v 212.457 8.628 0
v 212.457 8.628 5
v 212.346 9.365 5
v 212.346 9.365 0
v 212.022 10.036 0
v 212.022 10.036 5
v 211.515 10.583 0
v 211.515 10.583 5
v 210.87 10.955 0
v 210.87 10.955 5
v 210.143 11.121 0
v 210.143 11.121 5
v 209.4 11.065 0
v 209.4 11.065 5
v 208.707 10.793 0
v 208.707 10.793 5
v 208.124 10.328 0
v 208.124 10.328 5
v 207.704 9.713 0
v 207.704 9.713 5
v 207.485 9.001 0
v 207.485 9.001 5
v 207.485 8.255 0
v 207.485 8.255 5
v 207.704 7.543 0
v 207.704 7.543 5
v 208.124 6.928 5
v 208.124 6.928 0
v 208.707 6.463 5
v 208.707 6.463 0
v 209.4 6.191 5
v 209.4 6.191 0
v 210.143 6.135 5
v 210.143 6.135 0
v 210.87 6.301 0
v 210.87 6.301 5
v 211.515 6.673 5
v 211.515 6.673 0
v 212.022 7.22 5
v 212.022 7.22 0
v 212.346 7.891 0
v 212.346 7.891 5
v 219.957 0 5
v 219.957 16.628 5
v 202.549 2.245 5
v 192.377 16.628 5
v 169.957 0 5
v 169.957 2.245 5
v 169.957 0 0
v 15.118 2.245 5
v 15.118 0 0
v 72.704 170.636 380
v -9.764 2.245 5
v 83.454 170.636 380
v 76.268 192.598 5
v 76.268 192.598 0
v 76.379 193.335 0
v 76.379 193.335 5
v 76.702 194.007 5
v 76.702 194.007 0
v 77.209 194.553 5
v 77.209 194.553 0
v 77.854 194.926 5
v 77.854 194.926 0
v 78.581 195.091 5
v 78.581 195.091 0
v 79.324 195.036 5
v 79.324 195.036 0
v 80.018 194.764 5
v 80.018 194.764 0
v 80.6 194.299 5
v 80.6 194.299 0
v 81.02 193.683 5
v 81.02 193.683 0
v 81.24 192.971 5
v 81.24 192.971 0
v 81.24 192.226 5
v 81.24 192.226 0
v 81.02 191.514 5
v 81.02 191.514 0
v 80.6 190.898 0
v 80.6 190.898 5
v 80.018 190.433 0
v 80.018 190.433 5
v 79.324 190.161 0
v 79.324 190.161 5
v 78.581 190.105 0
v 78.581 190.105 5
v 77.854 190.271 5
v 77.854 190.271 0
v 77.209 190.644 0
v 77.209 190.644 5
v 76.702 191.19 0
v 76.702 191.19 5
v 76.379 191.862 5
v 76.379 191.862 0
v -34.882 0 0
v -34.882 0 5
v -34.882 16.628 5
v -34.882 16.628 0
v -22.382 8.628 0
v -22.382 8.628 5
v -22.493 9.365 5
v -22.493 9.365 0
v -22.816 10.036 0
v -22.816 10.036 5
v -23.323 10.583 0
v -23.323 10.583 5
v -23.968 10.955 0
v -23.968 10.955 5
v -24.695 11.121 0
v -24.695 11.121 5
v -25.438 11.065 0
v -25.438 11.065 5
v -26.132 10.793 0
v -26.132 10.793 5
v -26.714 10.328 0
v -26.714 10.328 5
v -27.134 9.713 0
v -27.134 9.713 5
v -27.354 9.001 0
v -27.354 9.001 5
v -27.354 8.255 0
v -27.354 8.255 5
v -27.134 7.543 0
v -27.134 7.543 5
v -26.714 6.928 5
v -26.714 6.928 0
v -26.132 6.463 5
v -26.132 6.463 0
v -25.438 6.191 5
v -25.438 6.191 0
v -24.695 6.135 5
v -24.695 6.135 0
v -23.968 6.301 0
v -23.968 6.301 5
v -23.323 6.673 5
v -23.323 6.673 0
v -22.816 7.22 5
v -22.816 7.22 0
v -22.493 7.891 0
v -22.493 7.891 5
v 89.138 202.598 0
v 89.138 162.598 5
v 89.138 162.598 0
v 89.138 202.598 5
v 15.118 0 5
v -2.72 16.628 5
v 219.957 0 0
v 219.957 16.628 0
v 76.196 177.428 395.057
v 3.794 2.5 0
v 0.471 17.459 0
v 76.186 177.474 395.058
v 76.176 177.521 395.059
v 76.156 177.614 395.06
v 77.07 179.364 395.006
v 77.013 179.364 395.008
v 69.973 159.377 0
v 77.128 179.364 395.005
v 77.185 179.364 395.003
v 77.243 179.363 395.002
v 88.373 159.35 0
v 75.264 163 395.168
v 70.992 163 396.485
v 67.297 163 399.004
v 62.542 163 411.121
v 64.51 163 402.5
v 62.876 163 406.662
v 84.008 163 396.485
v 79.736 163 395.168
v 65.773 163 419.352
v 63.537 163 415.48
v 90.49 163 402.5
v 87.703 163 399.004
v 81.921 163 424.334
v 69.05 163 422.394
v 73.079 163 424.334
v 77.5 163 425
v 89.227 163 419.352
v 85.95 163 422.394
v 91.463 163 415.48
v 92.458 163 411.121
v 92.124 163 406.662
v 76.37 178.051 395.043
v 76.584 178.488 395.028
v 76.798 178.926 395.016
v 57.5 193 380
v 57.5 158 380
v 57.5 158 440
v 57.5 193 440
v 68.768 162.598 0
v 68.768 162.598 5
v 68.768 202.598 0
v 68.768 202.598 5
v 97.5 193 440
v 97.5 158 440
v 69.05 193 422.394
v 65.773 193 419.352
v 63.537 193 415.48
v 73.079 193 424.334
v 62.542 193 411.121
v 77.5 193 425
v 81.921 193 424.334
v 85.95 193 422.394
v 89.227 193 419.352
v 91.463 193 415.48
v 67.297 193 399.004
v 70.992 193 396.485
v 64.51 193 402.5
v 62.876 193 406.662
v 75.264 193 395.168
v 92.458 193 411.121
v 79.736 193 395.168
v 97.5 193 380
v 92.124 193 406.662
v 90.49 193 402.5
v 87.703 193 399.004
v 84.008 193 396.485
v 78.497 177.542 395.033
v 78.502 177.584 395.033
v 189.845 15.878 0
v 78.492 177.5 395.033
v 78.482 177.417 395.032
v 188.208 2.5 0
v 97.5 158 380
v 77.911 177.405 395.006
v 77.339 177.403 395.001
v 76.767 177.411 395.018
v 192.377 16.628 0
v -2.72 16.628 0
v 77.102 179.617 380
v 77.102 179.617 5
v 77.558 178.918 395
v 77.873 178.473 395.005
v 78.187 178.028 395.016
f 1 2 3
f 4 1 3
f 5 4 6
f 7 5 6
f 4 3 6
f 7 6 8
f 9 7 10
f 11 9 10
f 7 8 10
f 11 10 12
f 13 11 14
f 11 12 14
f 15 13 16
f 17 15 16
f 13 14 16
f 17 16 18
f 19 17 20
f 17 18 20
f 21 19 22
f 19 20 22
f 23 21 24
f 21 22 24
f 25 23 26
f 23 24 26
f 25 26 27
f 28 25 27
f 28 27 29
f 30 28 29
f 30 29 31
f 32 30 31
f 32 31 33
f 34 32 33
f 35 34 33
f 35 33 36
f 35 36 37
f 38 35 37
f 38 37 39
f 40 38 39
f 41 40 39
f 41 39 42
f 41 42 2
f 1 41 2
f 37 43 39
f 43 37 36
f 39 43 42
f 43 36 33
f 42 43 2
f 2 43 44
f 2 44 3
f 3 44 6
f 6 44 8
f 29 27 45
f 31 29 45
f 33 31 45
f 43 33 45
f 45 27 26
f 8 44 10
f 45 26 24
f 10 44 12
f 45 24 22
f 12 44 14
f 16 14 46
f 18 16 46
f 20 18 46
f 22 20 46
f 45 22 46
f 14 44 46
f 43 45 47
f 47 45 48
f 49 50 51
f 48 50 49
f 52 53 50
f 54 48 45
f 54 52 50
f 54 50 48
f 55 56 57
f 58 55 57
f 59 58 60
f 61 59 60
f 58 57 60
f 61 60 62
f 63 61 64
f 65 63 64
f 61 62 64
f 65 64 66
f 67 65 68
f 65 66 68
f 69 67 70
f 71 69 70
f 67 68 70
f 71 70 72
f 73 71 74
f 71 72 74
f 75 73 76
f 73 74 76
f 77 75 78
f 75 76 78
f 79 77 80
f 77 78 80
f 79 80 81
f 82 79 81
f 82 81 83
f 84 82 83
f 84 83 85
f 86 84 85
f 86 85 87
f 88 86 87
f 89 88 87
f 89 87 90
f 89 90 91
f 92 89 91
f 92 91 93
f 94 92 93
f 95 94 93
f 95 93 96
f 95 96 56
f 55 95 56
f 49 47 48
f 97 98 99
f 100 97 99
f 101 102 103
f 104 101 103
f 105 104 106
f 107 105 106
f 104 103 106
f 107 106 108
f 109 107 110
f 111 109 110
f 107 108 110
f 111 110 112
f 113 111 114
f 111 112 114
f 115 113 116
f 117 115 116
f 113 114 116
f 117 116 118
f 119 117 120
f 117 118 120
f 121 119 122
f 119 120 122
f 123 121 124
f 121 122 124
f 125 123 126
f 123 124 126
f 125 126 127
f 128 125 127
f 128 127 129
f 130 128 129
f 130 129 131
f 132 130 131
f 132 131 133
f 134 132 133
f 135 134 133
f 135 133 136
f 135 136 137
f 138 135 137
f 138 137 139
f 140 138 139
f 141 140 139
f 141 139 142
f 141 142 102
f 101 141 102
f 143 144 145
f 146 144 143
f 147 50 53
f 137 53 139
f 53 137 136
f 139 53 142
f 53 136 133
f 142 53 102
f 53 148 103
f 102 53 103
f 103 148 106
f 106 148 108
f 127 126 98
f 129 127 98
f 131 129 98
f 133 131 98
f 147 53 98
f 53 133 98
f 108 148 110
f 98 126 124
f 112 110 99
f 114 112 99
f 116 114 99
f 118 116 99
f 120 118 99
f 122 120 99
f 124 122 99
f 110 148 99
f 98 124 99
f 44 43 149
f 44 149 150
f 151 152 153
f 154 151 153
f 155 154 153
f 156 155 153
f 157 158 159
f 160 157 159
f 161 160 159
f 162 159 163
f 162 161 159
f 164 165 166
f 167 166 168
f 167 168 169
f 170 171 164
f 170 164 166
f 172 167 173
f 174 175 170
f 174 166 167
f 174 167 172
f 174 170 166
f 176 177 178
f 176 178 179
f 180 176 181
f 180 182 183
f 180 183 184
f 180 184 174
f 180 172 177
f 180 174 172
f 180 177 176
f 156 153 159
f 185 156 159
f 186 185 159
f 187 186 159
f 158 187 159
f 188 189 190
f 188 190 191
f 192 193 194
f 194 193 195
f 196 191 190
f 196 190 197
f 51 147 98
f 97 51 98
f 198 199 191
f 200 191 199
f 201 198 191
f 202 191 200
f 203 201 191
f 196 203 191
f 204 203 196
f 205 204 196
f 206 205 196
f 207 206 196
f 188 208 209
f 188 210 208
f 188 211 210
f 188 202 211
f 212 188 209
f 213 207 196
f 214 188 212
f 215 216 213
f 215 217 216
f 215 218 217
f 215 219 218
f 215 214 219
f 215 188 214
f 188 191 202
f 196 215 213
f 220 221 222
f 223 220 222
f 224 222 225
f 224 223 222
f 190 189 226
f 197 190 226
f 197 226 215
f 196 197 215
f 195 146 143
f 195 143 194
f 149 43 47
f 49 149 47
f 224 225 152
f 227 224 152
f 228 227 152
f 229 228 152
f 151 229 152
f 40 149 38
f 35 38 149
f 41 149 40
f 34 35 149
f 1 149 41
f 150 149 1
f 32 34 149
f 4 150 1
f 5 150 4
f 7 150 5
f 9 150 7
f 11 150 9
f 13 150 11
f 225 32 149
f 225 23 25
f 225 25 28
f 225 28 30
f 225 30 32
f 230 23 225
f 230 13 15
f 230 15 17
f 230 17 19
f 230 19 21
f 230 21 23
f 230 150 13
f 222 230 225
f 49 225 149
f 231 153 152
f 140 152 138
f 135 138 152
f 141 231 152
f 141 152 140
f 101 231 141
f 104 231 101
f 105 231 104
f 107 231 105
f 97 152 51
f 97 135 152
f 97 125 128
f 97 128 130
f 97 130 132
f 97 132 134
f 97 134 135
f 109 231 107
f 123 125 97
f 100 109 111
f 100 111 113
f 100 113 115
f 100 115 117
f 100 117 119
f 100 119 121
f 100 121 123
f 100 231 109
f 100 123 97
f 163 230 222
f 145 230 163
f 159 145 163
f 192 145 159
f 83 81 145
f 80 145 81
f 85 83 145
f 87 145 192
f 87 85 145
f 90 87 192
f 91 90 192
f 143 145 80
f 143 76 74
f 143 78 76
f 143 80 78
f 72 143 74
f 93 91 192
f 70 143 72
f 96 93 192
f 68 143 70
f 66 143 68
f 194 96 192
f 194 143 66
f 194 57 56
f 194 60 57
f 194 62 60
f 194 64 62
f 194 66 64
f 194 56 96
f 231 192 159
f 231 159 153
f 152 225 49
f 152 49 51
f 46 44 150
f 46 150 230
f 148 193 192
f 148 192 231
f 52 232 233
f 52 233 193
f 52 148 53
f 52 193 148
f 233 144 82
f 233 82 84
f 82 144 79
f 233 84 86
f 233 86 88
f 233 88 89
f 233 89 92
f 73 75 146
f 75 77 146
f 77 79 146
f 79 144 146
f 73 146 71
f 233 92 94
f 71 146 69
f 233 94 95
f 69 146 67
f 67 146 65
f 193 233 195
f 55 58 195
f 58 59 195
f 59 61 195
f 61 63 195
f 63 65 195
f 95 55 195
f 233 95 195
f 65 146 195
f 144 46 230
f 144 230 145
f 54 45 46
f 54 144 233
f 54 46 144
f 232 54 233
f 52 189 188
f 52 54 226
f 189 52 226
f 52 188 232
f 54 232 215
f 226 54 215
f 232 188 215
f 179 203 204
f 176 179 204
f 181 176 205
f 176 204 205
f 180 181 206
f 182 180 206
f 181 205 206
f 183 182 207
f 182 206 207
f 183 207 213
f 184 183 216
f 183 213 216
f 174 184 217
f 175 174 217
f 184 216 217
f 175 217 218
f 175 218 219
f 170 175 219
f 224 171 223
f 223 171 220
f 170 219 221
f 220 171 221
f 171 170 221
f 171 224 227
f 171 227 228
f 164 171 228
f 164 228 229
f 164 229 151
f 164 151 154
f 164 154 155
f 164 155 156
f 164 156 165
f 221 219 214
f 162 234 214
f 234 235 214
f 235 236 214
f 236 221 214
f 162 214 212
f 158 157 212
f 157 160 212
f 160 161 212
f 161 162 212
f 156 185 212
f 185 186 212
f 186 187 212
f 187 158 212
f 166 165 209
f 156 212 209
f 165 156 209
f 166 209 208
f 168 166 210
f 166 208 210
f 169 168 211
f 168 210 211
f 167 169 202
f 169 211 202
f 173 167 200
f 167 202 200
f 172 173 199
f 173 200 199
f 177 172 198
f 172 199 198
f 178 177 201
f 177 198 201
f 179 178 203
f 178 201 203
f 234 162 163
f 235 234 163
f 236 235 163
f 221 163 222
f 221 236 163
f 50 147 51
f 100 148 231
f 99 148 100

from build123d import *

# Parameters (mm, degrees)
ESBO_O11_W               = 40
ESBO_O11_H               = 35
CORTE_EXTRUS_O2_DEPTH    = 20
ESBO_O12_W               = 40
ESBO_O12_H               = 35
RESSALTO_EXTRUS_O2_DEPTH = 60
ESBO_O14_R               = 15
CORTE_EXTRUS_O3_DEPTH    = 30
ESBO_O16_W               = 51.962510692
ESBO_O16_H               = 33.256097344
CORTE_EXTRUS_O5_DEPTH    = 5
ESBO_O17_W               = 50
ESBO_O17_H               = 16.628048672
RESSALTO_EXTRUS_O3_DEPTH = 5
ESBO_O18_W               = 68.360533092
ESBO_O18_H               = 33.256097344
CORTE_EXTRUS_O7_DEPTH    = 5
ESBO_O19_W               = 50
ESBO_O19_H               = 16.628048672
RESSALTO_EXTRUS_O4_DEPTH = 5
ESBO_O20_W               = 24.072418746
ESBO_O20_H               = 34.036375749
CORTE_EXTRUS_O8_DEPTH    = 5
ESBO_O21_W               = 20.37066465
ESBO_O21_H               = 40
RESSALTO_EXTRUS_O5_DEPTH = 5
ESBO_O22_R               = 2.5
CORTE_EXTRUS_O9_DEPTH    = 10
ESBO_O23_R               = 2.5
CORTE_EXTRUS_O10_DEPTH   = 10


with BuildPart() as part:
    # Esboço2 → Loft1 section 0
    with BuildSketch(Plane.XY, mode=Mode.PRIVATE) as loft1_s0:
        with BuildLine():
            Line((-10.863095238, 0), (204.136904762, 0))
            Line((204.136904762, 0), (77.102021041, 179.616642653))
            Line((77.102021041, 179.616642653), (-10.863095238, 0))
        make_face()
    loft([loft1_s0.sketch, Vertex(77.102021041, 179.616642653, 400)])

    # Esboço11 → Corte-extrusão2 (cut)
    with BuildSketch(Plane(origin=(77.102021041, 179.616642653, 400), x_dir=(1, 0, 0), z_dir=(0, 0, 1))):
        Rectangle(ESBO_O11_W, ESBO_O11_H)
    extrude(amount=-CORTE_EXTRUS_O2_DEPTH, mode=Mode.SUBTRACT)

    # Esboço12 → Ressalto-extrusão2 (add)
    with BuildSketch(Plane.XY.offset(380)):
        with Locations((77.5, 175.5)):
            Rectangle(ESBO_O12_W, ESBO_O12_H)
    extrude(amount=RESSALTO_EXTRUS_O2_DEPTH)

    # Esboço14 → Corte-extrusão3 (cut)
    with BuildSketch(Plane(origin=(0, 193, 0), x_dir=(1, 0, 0), z_dir=(0, 1, 0))):
        with Locations((77.5, -410)):
            Circle(ESBO_O14_R)
    extrude(amount=-CORTE_EXTRUS_O3_DEPTH, mode=Mode.SUBTRACT)

    # Esboço16 → Corte-extrusão5 (cut)
    with BuildSketch(Plane(origin=(0, 0, 0), x_dir=(-1, 0, 0), z_dir=(0, 0, -1))):
        with Locations((10.863095238, 0)):
            Rectangle(ESBO_O16_W, ESBO_O16_H)
    extrude(amount=-CORTE_EXTRUS_O5_DEPTH, mode=Mode.SUBTRACT)

    # Esboço17 → Ressalto-extrusão3 (add)
    with BuildSketch(Plane(origin=(0, 0, 5), x_dir=(-1, 0, 0), z_dir=(0, 0, -1))):
        with Locations((9.881839892, 8.314024336)):
            Rectangle(ESBO_O17_W, ESBO_O17_H)
    extrude(amount=RESSALTO_EXTRUS_O3_DEPTH)

    # Esboço18 → Corte-extrusão7 (cut)
    with BuildSketch(Plane(origin=(0, 0, 0), x_dir=(-1, 0, 0), z_dir=(0, 0, -1))):
        with Locations((-204.136904762, 0)):
            Rectangle(ESBO_O18_W, ESBO_O18_H)
    extrude(amount=-CORTE_EXTRUS_O7_DEPTH, mode=Mode.SUBTRACT)

    # Esboço19 → Ressalto-extrusão4 (add)
    with BuildSketch(Plane(origin=(0, 0, 5), x_dir=(-1, 0, 0), z_dir=(0, 0, -1))):
        with Locations((-194.956638216, 8.314024336)):
            Rectangle(ESBO_O19_W, ESBO_O19_H)
    extrude(amount=RESSALTO_EXTRUS_O4_DEPTH)

    # Esboço20 → Corte-extrusão8 (cut)
    with BuildSketch(Plane(origin=(0, 0, 0), x_dir=(-1, 0, 0), z_dir=(0, 0, -1))):
        with Locations((-77.102021041, 179.616642654)):
            Rectangle(ESBO_O20_W, ESBO_O20_H)
    extrude(amount=-CORTE_EXTRUS_O8_DEPTH, mode=Mode.SUBTRACT)

    # Esboço21 → Ressalto-extrusão5 (add)
    with BuildSketch(Plane(origin=(0, 0, 5), x_dir=(-1, 0, 0), z_dir=(0, 0, -1))):
        with Locations((-78.952898089, 182.598454779)):
            Rectangle(ESBO_O21_W, ESBO_O21_H)
    extrude(amount=RESSALTO_EXTRUS_O5_DEPTH)

    # Esboço22 → Corte-extrusão9 (cut)
    with BuildSketch(Plane.XY.offset(5)):
        with Locations((209.956638216, 8.628048672)):
            Circle(ESBO_O22_R)
        with Locations((-24.881839892, 8.628048672)):
            Circle(ESBO_O22_R)
    extrude(amount=-CORTE_EXTRUS_O9_DEPTH, mode=Mode.SUBTRACT)

    # Esboço23 → Corte-extrusão10 (cut)
    with BuildSketch(Plane(origin=(0, 0, 0), x_dir=(-1, 0, 0), z_dir=(0, 0, -1))):
        with Locations((-78.767565764, 192.598454779)):
            Circle(ESBO_O23_R)
    extrude(amount=-CORTE_EXTRUS_O10_DEPTH, mode=Mode.SUBTRACT)

    # Esboço26 → Loft de corte2 section 0
    with BuildSketch(Plane(origin=(0, 0, 0), x_dir=(-1, 0, 0), z_dir=(0, 0, -1)), mode=Mode.PRIVATE) as loft_de_corte2_s0:
        with BuildLine():
            Line((-188.207571555, 2.5), (-3.793574091, 2.5))
            Line((-3.793574091, 2.5), (-0.470951602, 17.45900541))
            Line((-0.470951602, 17.45900541), (-69.973362487, 159.376508934))
            Line((-69.973362487, 159.376508934), (-88.373391622, 159.350353061))
            Line((-88.373391622, 159.350353061), (-189.84504863, 15.877963255))
            Line((-189.84504863, 15.877963255), (-188.207571555, 2.5))
        make_face()
    loft([loft_de_corte2_s0.sketch, Vertex(77.102021041, 179.616642653, 400)], mode=Mode.SUBTRACT)


solid = part.part
